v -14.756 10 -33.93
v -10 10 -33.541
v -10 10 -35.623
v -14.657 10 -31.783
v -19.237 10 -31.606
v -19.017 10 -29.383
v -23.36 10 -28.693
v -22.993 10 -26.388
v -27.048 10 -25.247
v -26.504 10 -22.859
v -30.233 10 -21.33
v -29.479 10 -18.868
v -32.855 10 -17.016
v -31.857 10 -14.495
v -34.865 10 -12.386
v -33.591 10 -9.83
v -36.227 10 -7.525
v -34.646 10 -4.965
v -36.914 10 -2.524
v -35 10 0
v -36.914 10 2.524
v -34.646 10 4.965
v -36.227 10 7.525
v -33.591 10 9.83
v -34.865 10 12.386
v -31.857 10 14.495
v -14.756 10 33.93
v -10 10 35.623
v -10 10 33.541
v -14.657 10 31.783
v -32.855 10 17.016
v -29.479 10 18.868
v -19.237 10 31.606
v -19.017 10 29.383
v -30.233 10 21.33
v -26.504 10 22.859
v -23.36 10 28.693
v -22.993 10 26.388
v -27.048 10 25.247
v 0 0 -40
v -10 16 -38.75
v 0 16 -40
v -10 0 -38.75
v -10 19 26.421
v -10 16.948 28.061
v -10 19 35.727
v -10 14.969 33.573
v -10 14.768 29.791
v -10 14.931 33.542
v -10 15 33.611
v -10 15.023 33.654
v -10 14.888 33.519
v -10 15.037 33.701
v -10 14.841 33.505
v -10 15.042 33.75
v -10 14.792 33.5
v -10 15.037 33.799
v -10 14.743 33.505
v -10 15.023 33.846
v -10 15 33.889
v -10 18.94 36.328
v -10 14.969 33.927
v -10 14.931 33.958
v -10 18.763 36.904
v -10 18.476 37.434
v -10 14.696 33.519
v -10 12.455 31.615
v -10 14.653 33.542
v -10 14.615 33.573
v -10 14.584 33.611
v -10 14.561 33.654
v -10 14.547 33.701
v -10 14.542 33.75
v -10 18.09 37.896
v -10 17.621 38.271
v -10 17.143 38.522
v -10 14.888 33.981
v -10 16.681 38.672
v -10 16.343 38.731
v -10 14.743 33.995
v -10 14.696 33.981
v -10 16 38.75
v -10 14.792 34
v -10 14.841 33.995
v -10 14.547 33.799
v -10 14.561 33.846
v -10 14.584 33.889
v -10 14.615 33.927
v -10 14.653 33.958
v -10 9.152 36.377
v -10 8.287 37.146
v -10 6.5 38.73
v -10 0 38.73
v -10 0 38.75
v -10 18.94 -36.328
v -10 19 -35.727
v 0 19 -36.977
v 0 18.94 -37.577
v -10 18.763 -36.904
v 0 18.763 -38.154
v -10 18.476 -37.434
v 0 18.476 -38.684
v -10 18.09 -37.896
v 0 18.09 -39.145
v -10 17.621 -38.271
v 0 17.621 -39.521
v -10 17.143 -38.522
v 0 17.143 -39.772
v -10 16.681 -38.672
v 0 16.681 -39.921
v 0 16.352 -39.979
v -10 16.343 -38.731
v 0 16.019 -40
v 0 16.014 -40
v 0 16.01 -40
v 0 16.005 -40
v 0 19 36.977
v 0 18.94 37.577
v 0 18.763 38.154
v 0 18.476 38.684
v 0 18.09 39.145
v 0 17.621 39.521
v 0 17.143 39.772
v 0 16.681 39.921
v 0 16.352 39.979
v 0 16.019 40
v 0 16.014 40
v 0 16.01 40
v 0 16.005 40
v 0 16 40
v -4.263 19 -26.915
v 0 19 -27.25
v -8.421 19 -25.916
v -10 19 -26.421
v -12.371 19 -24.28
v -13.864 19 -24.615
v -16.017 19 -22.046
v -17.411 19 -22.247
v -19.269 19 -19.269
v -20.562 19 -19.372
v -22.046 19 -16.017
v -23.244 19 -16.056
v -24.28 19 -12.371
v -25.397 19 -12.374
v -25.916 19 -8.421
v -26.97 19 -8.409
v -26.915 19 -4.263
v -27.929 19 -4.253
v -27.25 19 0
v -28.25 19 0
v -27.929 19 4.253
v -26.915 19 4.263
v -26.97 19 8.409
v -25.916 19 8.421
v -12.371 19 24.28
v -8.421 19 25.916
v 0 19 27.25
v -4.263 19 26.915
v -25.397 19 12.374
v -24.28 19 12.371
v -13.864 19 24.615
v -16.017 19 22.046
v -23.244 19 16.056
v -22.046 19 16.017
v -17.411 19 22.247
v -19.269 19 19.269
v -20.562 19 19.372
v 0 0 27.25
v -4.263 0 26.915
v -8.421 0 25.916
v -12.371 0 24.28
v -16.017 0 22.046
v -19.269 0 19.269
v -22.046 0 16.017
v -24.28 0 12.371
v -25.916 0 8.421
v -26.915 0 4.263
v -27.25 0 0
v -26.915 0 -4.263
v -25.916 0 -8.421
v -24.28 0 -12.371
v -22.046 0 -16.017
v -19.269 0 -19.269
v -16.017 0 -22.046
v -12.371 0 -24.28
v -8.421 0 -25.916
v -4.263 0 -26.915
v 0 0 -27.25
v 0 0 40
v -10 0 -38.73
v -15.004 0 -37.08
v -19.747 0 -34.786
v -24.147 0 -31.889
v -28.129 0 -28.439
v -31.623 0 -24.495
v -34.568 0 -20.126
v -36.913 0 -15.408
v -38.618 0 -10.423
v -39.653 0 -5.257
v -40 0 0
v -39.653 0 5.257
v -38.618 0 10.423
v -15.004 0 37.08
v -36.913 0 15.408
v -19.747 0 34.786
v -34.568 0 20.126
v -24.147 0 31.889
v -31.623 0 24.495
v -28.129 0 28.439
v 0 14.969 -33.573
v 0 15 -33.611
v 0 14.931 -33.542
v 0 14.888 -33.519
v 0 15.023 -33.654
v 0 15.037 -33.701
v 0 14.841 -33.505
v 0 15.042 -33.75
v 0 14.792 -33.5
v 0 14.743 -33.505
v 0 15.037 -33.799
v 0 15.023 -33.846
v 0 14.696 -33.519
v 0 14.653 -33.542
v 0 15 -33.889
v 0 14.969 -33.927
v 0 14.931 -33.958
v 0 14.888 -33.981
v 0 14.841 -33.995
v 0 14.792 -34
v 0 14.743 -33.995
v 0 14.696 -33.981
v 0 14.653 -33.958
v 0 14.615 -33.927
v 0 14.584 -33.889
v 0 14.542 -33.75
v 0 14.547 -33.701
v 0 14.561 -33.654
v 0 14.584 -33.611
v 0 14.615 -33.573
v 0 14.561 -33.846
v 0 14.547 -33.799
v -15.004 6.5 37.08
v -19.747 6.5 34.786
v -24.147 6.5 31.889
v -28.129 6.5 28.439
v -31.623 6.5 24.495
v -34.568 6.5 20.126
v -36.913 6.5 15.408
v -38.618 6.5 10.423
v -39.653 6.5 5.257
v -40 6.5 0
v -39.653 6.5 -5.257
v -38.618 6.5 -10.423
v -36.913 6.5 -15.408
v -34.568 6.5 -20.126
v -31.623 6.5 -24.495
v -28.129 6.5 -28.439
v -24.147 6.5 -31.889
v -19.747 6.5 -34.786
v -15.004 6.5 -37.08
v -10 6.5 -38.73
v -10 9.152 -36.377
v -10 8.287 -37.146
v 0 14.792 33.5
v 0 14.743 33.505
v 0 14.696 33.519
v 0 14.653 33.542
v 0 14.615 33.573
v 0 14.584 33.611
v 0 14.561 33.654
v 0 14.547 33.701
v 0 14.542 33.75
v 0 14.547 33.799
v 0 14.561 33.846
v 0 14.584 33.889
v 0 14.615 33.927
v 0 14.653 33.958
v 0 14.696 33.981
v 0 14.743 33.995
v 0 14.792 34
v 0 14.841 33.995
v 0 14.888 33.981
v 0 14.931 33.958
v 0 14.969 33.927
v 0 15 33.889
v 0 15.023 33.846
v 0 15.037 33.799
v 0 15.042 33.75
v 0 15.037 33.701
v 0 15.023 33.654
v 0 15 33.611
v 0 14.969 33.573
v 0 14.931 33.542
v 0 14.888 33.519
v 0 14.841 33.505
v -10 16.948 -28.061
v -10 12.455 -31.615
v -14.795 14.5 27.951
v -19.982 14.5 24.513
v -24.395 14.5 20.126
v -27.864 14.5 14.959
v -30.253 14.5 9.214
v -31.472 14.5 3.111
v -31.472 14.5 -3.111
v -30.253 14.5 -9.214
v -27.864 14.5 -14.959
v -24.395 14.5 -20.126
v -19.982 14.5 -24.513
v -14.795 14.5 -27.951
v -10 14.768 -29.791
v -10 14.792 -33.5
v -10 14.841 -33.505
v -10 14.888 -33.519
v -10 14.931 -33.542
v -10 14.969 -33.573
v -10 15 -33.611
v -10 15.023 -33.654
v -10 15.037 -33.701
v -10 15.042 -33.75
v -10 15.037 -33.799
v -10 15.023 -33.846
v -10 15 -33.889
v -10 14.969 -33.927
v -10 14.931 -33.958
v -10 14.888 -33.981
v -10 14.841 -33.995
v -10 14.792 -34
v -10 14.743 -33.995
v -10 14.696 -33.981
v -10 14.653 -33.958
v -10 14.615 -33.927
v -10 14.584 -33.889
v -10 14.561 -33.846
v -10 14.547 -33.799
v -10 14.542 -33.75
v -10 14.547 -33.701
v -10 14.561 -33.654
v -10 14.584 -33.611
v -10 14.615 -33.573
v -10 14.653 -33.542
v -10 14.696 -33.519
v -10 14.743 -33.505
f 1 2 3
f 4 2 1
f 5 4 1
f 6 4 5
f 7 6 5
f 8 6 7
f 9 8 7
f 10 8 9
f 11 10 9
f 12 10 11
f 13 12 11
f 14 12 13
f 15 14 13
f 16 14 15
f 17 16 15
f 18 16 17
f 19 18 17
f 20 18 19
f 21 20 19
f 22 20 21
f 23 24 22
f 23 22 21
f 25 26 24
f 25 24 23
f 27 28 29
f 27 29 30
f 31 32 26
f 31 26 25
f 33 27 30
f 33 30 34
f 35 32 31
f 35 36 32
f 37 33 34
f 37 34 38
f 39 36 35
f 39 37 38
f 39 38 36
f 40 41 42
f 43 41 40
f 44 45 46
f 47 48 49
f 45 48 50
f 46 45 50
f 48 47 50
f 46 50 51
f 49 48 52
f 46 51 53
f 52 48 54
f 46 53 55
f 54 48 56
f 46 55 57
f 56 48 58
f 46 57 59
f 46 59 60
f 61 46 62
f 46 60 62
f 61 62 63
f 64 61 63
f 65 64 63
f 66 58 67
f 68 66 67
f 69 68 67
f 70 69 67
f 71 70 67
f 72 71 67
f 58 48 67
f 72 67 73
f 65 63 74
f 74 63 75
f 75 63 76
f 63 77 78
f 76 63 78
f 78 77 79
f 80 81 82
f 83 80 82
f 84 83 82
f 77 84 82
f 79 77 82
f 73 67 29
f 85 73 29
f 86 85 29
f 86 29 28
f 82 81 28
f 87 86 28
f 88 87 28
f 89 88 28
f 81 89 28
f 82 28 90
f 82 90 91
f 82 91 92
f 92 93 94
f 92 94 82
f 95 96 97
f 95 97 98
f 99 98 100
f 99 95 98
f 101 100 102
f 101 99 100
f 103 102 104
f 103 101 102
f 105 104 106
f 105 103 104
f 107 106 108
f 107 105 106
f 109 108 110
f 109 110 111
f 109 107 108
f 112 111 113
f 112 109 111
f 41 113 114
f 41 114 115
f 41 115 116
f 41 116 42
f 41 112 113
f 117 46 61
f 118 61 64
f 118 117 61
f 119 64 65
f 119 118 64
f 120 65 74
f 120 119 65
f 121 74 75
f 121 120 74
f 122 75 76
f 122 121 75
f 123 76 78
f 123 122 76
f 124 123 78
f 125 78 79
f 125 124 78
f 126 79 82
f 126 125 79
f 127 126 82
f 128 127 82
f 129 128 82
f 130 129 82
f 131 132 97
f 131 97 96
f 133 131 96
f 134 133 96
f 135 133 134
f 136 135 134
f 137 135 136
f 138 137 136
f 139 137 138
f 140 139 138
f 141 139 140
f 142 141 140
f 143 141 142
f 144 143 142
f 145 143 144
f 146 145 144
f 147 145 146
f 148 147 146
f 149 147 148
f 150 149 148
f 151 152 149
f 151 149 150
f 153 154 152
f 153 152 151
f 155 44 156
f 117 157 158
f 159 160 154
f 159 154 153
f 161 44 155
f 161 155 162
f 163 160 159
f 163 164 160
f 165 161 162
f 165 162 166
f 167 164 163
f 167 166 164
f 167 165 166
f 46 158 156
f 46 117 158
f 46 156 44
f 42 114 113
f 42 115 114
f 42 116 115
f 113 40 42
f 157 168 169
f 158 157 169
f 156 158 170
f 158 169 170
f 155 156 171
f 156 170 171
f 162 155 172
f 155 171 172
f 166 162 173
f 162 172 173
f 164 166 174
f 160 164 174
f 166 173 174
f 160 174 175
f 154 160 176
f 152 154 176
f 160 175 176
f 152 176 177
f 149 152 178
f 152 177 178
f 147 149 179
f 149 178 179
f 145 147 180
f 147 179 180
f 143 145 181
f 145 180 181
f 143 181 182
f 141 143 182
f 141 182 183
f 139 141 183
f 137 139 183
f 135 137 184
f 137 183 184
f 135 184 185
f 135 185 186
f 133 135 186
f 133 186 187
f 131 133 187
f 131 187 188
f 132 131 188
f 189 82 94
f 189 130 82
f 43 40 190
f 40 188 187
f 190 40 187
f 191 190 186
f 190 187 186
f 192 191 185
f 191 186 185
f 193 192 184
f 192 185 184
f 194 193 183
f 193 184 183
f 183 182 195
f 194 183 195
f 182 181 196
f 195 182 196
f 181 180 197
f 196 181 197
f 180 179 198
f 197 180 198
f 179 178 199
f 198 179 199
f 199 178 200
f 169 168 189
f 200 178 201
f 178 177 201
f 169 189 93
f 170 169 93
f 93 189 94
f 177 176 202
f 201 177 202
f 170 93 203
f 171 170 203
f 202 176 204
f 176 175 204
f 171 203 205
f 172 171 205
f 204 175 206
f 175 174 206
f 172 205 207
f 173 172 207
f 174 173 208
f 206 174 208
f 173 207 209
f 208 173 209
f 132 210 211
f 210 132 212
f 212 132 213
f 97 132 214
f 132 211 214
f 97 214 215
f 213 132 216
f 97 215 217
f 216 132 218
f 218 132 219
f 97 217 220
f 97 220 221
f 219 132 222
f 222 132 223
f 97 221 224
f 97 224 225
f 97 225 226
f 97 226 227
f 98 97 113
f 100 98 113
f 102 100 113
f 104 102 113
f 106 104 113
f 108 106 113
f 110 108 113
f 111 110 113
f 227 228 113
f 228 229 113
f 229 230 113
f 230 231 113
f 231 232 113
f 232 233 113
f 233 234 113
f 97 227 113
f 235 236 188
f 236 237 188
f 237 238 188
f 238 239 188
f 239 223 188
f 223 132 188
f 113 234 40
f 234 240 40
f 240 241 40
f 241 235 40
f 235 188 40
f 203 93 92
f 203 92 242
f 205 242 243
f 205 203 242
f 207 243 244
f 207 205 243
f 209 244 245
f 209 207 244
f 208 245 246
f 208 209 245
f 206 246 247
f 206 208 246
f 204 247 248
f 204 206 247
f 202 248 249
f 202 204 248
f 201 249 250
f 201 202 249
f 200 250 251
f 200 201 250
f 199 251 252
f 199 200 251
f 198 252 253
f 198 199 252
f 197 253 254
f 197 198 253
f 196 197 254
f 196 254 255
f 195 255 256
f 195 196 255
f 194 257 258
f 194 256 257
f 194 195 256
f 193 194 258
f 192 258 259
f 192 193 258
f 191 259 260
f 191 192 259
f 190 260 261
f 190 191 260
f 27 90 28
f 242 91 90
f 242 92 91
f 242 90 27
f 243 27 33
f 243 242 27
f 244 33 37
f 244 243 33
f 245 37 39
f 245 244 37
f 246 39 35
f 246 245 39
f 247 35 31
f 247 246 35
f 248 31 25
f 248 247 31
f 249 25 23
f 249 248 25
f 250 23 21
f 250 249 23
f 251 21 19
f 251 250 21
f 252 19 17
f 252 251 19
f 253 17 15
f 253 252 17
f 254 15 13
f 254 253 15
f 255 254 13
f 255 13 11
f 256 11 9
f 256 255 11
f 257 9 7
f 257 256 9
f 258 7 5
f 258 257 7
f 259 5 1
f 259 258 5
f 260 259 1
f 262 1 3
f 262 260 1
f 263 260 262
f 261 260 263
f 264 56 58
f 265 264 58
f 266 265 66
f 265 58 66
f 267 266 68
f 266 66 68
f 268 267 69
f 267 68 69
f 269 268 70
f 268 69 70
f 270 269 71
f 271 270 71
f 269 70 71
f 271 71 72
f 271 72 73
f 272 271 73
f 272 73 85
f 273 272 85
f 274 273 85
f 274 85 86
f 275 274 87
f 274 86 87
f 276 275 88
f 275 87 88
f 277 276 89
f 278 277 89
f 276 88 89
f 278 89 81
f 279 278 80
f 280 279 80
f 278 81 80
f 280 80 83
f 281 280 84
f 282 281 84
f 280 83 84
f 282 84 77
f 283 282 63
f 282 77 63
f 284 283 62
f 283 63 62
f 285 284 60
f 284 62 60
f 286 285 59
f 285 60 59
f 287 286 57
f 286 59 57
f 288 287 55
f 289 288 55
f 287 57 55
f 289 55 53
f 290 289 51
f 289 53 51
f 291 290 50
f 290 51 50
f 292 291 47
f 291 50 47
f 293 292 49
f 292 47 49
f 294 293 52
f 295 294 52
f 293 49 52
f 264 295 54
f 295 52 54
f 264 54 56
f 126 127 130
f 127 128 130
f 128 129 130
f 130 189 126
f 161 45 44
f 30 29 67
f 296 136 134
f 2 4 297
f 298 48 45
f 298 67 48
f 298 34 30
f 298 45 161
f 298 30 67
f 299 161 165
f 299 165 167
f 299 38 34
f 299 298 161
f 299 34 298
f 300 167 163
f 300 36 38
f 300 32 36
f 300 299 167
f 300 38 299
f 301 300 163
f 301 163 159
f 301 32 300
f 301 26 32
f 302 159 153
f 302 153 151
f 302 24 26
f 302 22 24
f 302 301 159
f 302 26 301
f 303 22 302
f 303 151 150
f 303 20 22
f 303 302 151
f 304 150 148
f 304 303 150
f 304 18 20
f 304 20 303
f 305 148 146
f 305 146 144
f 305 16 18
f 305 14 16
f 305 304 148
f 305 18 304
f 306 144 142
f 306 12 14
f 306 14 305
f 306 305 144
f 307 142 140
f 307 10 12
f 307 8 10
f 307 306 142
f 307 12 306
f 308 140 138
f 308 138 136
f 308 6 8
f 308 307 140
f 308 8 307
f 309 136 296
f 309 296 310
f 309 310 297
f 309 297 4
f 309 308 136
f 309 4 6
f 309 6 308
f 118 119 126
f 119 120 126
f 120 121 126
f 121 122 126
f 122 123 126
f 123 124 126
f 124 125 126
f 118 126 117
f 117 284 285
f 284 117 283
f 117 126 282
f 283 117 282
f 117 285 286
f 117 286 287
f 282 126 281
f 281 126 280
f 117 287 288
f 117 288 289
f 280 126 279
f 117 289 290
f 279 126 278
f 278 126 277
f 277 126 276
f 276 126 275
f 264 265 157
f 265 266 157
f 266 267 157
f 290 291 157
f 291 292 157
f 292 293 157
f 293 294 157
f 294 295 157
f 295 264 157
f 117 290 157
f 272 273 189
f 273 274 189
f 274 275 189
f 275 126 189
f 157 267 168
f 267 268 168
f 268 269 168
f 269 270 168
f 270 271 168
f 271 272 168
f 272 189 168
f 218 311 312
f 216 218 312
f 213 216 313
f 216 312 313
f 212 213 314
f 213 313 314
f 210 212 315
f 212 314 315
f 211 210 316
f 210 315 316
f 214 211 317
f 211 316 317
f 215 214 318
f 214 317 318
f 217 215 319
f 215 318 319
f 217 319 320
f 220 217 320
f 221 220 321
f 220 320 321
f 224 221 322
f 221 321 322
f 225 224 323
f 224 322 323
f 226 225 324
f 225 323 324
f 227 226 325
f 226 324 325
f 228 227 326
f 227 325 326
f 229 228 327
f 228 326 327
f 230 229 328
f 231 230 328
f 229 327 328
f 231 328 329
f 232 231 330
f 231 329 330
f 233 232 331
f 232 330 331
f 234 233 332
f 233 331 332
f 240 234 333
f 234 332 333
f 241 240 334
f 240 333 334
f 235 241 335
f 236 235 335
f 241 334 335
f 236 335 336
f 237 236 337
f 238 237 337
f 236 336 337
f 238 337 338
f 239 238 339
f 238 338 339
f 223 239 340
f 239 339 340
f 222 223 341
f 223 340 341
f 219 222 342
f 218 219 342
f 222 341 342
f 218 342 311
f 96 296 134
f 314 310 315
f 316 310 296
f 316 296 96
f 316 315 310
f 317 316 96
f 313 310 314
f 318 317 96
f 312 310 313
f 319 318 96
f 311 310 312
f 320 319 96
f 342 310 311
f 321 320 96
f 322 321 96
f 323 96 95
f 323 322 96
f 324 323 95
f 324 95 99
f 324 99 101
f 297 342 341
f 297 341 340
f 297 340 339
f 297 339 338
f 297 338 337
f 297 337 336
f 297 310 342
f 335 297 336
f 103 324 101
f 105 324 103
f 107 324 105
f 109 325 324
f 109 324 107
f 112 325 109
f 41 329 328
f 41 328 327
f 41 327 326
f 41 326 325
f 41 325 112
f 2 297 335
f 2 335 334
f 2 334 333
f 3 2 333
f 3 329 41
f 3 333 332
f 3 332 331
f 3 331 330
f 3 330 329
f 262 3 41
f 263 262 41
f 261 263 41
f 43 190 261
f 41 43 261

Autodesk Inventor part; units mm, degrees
ref_plane "YZ Plane" through (0, 0, 0) normal (1, 0, 0) x (0, 1, 0)
ref_plane "XZ Plane" through (0, 0, 0) normal (0, 1, 0) x (-1, 0, 0)
ref_plane "XY Plane" through (0, 0, 0) normal (0, 0, 1) x (1, 0, 0)
sketch "Sketch1" plane through (0, 0, 0) normal (0, 1, 0) x (-1, 0, 0)
  circle A0 centre (0, 0) radius 27.25
  circle A1 centre (0, 0) radius 40
  line L0 (0, 40) -> (0, -40)
  line L1 (0, 27.25) -> (0, 40)
  line L2 (0, 0) -> (45.8367, 0)
  line L3 (0, -27.25) -> (0, -40)
  circle A2 centre (0, 0) radius 35
  line L4 (0, -27.25) -> (10, -27.25)
  line L5 (10, -27.25) -> (10, -40)
  line L6 (10, -40) -> (0, -40)
  line L7 (0, -40) -> (0, -27.25)
  line L8 (0, 27.25) -> (10, 27.25)
  line L9 (10, 27.25) -> (10, 40)
  line L10 (10, 40) -> (0, 40)
  point P0 (0, -26.75)
  point P1 (0, 35)
  point P2 (0, -35)
  point P3 (10, -33.541)
  point P4 (10, 38.7298)
  point P5 (10, 33.541)
  dimension "d0" = 54.5
  dimension "d1" = 80
  dimension "d15" = 70
  dimension "d18" = 10
extrude "Extrusion6" add sketch "Sketch1" along normal blind 10 contours A2 L9 A1 L2 | L2 A1 L5 A2 | L0 A1 L9 A2 | A2 L5 A1 L0
extrude "Extrusion7" add sketch "Sketch1" along normal blind 19 contours L2 A2 L5 L4 A0 | A0 L8 L9 A2 L2 | L0 A2 L9 L8 | L4 L5 A2 L0 | L0 A1 L9 A2 | A2 L5 A1 L0 | L10 L9 A1 | A1 L5 L6
chamfer "Chamfer1" distance 10 distance2 1.25 1 edges at (-10, 9.5, -40) measured on face at (-3.3333, 6.3333, -40)
chamfer "Chamfer2" distance 1.25 distance2 10 1 edges at (-10, 9.5, 40) measured on face at (-10, 16, 37.4236)
chamfer "Chamfer3" distance 6.75 distance2 9 1 edges at (-35, 19, 0) measured on face at (-3.3335, 19, -33.597)
chamfer "Chamfer4" distance 3 distance2 3.5 1 edges at (-40, 10, 0) measured on face at (-36.5086, 10, 0)
fillet "Fillet1" radius 3 2 edges at (-5.0003, 19, 39.3753) (-5.0003, 19, -39.3753)
sketch "Sketch3" plane through (-10, 0, -38.7298) normal (-1, 0, 0) x (0, 0, 1)
  line L0 (-0.0202, 0) -> (-0.0202, 16) projected
  line L1 (-0.0202, 14.7921) -> (4.9798, 14.7921)
  line L2 (4.9798, 14.7921) -> (4.9798, 19.7921)
  circle A0 centre (4.9798, 14.7921) radius 0.25
  point P0 (38.7298, 0)
  dimension "d32" = 5
  dimension "d33" = 5
  dimension "d34" = 0.5
extrude "Extrusion8" cut sketch "Sketch3" against normal through all
mirror "Mirror1" about plane through (0, 0, 0) normal (0, 0, 1) of "Extrusion8"
properties part number "Obrecz_kolanko"
